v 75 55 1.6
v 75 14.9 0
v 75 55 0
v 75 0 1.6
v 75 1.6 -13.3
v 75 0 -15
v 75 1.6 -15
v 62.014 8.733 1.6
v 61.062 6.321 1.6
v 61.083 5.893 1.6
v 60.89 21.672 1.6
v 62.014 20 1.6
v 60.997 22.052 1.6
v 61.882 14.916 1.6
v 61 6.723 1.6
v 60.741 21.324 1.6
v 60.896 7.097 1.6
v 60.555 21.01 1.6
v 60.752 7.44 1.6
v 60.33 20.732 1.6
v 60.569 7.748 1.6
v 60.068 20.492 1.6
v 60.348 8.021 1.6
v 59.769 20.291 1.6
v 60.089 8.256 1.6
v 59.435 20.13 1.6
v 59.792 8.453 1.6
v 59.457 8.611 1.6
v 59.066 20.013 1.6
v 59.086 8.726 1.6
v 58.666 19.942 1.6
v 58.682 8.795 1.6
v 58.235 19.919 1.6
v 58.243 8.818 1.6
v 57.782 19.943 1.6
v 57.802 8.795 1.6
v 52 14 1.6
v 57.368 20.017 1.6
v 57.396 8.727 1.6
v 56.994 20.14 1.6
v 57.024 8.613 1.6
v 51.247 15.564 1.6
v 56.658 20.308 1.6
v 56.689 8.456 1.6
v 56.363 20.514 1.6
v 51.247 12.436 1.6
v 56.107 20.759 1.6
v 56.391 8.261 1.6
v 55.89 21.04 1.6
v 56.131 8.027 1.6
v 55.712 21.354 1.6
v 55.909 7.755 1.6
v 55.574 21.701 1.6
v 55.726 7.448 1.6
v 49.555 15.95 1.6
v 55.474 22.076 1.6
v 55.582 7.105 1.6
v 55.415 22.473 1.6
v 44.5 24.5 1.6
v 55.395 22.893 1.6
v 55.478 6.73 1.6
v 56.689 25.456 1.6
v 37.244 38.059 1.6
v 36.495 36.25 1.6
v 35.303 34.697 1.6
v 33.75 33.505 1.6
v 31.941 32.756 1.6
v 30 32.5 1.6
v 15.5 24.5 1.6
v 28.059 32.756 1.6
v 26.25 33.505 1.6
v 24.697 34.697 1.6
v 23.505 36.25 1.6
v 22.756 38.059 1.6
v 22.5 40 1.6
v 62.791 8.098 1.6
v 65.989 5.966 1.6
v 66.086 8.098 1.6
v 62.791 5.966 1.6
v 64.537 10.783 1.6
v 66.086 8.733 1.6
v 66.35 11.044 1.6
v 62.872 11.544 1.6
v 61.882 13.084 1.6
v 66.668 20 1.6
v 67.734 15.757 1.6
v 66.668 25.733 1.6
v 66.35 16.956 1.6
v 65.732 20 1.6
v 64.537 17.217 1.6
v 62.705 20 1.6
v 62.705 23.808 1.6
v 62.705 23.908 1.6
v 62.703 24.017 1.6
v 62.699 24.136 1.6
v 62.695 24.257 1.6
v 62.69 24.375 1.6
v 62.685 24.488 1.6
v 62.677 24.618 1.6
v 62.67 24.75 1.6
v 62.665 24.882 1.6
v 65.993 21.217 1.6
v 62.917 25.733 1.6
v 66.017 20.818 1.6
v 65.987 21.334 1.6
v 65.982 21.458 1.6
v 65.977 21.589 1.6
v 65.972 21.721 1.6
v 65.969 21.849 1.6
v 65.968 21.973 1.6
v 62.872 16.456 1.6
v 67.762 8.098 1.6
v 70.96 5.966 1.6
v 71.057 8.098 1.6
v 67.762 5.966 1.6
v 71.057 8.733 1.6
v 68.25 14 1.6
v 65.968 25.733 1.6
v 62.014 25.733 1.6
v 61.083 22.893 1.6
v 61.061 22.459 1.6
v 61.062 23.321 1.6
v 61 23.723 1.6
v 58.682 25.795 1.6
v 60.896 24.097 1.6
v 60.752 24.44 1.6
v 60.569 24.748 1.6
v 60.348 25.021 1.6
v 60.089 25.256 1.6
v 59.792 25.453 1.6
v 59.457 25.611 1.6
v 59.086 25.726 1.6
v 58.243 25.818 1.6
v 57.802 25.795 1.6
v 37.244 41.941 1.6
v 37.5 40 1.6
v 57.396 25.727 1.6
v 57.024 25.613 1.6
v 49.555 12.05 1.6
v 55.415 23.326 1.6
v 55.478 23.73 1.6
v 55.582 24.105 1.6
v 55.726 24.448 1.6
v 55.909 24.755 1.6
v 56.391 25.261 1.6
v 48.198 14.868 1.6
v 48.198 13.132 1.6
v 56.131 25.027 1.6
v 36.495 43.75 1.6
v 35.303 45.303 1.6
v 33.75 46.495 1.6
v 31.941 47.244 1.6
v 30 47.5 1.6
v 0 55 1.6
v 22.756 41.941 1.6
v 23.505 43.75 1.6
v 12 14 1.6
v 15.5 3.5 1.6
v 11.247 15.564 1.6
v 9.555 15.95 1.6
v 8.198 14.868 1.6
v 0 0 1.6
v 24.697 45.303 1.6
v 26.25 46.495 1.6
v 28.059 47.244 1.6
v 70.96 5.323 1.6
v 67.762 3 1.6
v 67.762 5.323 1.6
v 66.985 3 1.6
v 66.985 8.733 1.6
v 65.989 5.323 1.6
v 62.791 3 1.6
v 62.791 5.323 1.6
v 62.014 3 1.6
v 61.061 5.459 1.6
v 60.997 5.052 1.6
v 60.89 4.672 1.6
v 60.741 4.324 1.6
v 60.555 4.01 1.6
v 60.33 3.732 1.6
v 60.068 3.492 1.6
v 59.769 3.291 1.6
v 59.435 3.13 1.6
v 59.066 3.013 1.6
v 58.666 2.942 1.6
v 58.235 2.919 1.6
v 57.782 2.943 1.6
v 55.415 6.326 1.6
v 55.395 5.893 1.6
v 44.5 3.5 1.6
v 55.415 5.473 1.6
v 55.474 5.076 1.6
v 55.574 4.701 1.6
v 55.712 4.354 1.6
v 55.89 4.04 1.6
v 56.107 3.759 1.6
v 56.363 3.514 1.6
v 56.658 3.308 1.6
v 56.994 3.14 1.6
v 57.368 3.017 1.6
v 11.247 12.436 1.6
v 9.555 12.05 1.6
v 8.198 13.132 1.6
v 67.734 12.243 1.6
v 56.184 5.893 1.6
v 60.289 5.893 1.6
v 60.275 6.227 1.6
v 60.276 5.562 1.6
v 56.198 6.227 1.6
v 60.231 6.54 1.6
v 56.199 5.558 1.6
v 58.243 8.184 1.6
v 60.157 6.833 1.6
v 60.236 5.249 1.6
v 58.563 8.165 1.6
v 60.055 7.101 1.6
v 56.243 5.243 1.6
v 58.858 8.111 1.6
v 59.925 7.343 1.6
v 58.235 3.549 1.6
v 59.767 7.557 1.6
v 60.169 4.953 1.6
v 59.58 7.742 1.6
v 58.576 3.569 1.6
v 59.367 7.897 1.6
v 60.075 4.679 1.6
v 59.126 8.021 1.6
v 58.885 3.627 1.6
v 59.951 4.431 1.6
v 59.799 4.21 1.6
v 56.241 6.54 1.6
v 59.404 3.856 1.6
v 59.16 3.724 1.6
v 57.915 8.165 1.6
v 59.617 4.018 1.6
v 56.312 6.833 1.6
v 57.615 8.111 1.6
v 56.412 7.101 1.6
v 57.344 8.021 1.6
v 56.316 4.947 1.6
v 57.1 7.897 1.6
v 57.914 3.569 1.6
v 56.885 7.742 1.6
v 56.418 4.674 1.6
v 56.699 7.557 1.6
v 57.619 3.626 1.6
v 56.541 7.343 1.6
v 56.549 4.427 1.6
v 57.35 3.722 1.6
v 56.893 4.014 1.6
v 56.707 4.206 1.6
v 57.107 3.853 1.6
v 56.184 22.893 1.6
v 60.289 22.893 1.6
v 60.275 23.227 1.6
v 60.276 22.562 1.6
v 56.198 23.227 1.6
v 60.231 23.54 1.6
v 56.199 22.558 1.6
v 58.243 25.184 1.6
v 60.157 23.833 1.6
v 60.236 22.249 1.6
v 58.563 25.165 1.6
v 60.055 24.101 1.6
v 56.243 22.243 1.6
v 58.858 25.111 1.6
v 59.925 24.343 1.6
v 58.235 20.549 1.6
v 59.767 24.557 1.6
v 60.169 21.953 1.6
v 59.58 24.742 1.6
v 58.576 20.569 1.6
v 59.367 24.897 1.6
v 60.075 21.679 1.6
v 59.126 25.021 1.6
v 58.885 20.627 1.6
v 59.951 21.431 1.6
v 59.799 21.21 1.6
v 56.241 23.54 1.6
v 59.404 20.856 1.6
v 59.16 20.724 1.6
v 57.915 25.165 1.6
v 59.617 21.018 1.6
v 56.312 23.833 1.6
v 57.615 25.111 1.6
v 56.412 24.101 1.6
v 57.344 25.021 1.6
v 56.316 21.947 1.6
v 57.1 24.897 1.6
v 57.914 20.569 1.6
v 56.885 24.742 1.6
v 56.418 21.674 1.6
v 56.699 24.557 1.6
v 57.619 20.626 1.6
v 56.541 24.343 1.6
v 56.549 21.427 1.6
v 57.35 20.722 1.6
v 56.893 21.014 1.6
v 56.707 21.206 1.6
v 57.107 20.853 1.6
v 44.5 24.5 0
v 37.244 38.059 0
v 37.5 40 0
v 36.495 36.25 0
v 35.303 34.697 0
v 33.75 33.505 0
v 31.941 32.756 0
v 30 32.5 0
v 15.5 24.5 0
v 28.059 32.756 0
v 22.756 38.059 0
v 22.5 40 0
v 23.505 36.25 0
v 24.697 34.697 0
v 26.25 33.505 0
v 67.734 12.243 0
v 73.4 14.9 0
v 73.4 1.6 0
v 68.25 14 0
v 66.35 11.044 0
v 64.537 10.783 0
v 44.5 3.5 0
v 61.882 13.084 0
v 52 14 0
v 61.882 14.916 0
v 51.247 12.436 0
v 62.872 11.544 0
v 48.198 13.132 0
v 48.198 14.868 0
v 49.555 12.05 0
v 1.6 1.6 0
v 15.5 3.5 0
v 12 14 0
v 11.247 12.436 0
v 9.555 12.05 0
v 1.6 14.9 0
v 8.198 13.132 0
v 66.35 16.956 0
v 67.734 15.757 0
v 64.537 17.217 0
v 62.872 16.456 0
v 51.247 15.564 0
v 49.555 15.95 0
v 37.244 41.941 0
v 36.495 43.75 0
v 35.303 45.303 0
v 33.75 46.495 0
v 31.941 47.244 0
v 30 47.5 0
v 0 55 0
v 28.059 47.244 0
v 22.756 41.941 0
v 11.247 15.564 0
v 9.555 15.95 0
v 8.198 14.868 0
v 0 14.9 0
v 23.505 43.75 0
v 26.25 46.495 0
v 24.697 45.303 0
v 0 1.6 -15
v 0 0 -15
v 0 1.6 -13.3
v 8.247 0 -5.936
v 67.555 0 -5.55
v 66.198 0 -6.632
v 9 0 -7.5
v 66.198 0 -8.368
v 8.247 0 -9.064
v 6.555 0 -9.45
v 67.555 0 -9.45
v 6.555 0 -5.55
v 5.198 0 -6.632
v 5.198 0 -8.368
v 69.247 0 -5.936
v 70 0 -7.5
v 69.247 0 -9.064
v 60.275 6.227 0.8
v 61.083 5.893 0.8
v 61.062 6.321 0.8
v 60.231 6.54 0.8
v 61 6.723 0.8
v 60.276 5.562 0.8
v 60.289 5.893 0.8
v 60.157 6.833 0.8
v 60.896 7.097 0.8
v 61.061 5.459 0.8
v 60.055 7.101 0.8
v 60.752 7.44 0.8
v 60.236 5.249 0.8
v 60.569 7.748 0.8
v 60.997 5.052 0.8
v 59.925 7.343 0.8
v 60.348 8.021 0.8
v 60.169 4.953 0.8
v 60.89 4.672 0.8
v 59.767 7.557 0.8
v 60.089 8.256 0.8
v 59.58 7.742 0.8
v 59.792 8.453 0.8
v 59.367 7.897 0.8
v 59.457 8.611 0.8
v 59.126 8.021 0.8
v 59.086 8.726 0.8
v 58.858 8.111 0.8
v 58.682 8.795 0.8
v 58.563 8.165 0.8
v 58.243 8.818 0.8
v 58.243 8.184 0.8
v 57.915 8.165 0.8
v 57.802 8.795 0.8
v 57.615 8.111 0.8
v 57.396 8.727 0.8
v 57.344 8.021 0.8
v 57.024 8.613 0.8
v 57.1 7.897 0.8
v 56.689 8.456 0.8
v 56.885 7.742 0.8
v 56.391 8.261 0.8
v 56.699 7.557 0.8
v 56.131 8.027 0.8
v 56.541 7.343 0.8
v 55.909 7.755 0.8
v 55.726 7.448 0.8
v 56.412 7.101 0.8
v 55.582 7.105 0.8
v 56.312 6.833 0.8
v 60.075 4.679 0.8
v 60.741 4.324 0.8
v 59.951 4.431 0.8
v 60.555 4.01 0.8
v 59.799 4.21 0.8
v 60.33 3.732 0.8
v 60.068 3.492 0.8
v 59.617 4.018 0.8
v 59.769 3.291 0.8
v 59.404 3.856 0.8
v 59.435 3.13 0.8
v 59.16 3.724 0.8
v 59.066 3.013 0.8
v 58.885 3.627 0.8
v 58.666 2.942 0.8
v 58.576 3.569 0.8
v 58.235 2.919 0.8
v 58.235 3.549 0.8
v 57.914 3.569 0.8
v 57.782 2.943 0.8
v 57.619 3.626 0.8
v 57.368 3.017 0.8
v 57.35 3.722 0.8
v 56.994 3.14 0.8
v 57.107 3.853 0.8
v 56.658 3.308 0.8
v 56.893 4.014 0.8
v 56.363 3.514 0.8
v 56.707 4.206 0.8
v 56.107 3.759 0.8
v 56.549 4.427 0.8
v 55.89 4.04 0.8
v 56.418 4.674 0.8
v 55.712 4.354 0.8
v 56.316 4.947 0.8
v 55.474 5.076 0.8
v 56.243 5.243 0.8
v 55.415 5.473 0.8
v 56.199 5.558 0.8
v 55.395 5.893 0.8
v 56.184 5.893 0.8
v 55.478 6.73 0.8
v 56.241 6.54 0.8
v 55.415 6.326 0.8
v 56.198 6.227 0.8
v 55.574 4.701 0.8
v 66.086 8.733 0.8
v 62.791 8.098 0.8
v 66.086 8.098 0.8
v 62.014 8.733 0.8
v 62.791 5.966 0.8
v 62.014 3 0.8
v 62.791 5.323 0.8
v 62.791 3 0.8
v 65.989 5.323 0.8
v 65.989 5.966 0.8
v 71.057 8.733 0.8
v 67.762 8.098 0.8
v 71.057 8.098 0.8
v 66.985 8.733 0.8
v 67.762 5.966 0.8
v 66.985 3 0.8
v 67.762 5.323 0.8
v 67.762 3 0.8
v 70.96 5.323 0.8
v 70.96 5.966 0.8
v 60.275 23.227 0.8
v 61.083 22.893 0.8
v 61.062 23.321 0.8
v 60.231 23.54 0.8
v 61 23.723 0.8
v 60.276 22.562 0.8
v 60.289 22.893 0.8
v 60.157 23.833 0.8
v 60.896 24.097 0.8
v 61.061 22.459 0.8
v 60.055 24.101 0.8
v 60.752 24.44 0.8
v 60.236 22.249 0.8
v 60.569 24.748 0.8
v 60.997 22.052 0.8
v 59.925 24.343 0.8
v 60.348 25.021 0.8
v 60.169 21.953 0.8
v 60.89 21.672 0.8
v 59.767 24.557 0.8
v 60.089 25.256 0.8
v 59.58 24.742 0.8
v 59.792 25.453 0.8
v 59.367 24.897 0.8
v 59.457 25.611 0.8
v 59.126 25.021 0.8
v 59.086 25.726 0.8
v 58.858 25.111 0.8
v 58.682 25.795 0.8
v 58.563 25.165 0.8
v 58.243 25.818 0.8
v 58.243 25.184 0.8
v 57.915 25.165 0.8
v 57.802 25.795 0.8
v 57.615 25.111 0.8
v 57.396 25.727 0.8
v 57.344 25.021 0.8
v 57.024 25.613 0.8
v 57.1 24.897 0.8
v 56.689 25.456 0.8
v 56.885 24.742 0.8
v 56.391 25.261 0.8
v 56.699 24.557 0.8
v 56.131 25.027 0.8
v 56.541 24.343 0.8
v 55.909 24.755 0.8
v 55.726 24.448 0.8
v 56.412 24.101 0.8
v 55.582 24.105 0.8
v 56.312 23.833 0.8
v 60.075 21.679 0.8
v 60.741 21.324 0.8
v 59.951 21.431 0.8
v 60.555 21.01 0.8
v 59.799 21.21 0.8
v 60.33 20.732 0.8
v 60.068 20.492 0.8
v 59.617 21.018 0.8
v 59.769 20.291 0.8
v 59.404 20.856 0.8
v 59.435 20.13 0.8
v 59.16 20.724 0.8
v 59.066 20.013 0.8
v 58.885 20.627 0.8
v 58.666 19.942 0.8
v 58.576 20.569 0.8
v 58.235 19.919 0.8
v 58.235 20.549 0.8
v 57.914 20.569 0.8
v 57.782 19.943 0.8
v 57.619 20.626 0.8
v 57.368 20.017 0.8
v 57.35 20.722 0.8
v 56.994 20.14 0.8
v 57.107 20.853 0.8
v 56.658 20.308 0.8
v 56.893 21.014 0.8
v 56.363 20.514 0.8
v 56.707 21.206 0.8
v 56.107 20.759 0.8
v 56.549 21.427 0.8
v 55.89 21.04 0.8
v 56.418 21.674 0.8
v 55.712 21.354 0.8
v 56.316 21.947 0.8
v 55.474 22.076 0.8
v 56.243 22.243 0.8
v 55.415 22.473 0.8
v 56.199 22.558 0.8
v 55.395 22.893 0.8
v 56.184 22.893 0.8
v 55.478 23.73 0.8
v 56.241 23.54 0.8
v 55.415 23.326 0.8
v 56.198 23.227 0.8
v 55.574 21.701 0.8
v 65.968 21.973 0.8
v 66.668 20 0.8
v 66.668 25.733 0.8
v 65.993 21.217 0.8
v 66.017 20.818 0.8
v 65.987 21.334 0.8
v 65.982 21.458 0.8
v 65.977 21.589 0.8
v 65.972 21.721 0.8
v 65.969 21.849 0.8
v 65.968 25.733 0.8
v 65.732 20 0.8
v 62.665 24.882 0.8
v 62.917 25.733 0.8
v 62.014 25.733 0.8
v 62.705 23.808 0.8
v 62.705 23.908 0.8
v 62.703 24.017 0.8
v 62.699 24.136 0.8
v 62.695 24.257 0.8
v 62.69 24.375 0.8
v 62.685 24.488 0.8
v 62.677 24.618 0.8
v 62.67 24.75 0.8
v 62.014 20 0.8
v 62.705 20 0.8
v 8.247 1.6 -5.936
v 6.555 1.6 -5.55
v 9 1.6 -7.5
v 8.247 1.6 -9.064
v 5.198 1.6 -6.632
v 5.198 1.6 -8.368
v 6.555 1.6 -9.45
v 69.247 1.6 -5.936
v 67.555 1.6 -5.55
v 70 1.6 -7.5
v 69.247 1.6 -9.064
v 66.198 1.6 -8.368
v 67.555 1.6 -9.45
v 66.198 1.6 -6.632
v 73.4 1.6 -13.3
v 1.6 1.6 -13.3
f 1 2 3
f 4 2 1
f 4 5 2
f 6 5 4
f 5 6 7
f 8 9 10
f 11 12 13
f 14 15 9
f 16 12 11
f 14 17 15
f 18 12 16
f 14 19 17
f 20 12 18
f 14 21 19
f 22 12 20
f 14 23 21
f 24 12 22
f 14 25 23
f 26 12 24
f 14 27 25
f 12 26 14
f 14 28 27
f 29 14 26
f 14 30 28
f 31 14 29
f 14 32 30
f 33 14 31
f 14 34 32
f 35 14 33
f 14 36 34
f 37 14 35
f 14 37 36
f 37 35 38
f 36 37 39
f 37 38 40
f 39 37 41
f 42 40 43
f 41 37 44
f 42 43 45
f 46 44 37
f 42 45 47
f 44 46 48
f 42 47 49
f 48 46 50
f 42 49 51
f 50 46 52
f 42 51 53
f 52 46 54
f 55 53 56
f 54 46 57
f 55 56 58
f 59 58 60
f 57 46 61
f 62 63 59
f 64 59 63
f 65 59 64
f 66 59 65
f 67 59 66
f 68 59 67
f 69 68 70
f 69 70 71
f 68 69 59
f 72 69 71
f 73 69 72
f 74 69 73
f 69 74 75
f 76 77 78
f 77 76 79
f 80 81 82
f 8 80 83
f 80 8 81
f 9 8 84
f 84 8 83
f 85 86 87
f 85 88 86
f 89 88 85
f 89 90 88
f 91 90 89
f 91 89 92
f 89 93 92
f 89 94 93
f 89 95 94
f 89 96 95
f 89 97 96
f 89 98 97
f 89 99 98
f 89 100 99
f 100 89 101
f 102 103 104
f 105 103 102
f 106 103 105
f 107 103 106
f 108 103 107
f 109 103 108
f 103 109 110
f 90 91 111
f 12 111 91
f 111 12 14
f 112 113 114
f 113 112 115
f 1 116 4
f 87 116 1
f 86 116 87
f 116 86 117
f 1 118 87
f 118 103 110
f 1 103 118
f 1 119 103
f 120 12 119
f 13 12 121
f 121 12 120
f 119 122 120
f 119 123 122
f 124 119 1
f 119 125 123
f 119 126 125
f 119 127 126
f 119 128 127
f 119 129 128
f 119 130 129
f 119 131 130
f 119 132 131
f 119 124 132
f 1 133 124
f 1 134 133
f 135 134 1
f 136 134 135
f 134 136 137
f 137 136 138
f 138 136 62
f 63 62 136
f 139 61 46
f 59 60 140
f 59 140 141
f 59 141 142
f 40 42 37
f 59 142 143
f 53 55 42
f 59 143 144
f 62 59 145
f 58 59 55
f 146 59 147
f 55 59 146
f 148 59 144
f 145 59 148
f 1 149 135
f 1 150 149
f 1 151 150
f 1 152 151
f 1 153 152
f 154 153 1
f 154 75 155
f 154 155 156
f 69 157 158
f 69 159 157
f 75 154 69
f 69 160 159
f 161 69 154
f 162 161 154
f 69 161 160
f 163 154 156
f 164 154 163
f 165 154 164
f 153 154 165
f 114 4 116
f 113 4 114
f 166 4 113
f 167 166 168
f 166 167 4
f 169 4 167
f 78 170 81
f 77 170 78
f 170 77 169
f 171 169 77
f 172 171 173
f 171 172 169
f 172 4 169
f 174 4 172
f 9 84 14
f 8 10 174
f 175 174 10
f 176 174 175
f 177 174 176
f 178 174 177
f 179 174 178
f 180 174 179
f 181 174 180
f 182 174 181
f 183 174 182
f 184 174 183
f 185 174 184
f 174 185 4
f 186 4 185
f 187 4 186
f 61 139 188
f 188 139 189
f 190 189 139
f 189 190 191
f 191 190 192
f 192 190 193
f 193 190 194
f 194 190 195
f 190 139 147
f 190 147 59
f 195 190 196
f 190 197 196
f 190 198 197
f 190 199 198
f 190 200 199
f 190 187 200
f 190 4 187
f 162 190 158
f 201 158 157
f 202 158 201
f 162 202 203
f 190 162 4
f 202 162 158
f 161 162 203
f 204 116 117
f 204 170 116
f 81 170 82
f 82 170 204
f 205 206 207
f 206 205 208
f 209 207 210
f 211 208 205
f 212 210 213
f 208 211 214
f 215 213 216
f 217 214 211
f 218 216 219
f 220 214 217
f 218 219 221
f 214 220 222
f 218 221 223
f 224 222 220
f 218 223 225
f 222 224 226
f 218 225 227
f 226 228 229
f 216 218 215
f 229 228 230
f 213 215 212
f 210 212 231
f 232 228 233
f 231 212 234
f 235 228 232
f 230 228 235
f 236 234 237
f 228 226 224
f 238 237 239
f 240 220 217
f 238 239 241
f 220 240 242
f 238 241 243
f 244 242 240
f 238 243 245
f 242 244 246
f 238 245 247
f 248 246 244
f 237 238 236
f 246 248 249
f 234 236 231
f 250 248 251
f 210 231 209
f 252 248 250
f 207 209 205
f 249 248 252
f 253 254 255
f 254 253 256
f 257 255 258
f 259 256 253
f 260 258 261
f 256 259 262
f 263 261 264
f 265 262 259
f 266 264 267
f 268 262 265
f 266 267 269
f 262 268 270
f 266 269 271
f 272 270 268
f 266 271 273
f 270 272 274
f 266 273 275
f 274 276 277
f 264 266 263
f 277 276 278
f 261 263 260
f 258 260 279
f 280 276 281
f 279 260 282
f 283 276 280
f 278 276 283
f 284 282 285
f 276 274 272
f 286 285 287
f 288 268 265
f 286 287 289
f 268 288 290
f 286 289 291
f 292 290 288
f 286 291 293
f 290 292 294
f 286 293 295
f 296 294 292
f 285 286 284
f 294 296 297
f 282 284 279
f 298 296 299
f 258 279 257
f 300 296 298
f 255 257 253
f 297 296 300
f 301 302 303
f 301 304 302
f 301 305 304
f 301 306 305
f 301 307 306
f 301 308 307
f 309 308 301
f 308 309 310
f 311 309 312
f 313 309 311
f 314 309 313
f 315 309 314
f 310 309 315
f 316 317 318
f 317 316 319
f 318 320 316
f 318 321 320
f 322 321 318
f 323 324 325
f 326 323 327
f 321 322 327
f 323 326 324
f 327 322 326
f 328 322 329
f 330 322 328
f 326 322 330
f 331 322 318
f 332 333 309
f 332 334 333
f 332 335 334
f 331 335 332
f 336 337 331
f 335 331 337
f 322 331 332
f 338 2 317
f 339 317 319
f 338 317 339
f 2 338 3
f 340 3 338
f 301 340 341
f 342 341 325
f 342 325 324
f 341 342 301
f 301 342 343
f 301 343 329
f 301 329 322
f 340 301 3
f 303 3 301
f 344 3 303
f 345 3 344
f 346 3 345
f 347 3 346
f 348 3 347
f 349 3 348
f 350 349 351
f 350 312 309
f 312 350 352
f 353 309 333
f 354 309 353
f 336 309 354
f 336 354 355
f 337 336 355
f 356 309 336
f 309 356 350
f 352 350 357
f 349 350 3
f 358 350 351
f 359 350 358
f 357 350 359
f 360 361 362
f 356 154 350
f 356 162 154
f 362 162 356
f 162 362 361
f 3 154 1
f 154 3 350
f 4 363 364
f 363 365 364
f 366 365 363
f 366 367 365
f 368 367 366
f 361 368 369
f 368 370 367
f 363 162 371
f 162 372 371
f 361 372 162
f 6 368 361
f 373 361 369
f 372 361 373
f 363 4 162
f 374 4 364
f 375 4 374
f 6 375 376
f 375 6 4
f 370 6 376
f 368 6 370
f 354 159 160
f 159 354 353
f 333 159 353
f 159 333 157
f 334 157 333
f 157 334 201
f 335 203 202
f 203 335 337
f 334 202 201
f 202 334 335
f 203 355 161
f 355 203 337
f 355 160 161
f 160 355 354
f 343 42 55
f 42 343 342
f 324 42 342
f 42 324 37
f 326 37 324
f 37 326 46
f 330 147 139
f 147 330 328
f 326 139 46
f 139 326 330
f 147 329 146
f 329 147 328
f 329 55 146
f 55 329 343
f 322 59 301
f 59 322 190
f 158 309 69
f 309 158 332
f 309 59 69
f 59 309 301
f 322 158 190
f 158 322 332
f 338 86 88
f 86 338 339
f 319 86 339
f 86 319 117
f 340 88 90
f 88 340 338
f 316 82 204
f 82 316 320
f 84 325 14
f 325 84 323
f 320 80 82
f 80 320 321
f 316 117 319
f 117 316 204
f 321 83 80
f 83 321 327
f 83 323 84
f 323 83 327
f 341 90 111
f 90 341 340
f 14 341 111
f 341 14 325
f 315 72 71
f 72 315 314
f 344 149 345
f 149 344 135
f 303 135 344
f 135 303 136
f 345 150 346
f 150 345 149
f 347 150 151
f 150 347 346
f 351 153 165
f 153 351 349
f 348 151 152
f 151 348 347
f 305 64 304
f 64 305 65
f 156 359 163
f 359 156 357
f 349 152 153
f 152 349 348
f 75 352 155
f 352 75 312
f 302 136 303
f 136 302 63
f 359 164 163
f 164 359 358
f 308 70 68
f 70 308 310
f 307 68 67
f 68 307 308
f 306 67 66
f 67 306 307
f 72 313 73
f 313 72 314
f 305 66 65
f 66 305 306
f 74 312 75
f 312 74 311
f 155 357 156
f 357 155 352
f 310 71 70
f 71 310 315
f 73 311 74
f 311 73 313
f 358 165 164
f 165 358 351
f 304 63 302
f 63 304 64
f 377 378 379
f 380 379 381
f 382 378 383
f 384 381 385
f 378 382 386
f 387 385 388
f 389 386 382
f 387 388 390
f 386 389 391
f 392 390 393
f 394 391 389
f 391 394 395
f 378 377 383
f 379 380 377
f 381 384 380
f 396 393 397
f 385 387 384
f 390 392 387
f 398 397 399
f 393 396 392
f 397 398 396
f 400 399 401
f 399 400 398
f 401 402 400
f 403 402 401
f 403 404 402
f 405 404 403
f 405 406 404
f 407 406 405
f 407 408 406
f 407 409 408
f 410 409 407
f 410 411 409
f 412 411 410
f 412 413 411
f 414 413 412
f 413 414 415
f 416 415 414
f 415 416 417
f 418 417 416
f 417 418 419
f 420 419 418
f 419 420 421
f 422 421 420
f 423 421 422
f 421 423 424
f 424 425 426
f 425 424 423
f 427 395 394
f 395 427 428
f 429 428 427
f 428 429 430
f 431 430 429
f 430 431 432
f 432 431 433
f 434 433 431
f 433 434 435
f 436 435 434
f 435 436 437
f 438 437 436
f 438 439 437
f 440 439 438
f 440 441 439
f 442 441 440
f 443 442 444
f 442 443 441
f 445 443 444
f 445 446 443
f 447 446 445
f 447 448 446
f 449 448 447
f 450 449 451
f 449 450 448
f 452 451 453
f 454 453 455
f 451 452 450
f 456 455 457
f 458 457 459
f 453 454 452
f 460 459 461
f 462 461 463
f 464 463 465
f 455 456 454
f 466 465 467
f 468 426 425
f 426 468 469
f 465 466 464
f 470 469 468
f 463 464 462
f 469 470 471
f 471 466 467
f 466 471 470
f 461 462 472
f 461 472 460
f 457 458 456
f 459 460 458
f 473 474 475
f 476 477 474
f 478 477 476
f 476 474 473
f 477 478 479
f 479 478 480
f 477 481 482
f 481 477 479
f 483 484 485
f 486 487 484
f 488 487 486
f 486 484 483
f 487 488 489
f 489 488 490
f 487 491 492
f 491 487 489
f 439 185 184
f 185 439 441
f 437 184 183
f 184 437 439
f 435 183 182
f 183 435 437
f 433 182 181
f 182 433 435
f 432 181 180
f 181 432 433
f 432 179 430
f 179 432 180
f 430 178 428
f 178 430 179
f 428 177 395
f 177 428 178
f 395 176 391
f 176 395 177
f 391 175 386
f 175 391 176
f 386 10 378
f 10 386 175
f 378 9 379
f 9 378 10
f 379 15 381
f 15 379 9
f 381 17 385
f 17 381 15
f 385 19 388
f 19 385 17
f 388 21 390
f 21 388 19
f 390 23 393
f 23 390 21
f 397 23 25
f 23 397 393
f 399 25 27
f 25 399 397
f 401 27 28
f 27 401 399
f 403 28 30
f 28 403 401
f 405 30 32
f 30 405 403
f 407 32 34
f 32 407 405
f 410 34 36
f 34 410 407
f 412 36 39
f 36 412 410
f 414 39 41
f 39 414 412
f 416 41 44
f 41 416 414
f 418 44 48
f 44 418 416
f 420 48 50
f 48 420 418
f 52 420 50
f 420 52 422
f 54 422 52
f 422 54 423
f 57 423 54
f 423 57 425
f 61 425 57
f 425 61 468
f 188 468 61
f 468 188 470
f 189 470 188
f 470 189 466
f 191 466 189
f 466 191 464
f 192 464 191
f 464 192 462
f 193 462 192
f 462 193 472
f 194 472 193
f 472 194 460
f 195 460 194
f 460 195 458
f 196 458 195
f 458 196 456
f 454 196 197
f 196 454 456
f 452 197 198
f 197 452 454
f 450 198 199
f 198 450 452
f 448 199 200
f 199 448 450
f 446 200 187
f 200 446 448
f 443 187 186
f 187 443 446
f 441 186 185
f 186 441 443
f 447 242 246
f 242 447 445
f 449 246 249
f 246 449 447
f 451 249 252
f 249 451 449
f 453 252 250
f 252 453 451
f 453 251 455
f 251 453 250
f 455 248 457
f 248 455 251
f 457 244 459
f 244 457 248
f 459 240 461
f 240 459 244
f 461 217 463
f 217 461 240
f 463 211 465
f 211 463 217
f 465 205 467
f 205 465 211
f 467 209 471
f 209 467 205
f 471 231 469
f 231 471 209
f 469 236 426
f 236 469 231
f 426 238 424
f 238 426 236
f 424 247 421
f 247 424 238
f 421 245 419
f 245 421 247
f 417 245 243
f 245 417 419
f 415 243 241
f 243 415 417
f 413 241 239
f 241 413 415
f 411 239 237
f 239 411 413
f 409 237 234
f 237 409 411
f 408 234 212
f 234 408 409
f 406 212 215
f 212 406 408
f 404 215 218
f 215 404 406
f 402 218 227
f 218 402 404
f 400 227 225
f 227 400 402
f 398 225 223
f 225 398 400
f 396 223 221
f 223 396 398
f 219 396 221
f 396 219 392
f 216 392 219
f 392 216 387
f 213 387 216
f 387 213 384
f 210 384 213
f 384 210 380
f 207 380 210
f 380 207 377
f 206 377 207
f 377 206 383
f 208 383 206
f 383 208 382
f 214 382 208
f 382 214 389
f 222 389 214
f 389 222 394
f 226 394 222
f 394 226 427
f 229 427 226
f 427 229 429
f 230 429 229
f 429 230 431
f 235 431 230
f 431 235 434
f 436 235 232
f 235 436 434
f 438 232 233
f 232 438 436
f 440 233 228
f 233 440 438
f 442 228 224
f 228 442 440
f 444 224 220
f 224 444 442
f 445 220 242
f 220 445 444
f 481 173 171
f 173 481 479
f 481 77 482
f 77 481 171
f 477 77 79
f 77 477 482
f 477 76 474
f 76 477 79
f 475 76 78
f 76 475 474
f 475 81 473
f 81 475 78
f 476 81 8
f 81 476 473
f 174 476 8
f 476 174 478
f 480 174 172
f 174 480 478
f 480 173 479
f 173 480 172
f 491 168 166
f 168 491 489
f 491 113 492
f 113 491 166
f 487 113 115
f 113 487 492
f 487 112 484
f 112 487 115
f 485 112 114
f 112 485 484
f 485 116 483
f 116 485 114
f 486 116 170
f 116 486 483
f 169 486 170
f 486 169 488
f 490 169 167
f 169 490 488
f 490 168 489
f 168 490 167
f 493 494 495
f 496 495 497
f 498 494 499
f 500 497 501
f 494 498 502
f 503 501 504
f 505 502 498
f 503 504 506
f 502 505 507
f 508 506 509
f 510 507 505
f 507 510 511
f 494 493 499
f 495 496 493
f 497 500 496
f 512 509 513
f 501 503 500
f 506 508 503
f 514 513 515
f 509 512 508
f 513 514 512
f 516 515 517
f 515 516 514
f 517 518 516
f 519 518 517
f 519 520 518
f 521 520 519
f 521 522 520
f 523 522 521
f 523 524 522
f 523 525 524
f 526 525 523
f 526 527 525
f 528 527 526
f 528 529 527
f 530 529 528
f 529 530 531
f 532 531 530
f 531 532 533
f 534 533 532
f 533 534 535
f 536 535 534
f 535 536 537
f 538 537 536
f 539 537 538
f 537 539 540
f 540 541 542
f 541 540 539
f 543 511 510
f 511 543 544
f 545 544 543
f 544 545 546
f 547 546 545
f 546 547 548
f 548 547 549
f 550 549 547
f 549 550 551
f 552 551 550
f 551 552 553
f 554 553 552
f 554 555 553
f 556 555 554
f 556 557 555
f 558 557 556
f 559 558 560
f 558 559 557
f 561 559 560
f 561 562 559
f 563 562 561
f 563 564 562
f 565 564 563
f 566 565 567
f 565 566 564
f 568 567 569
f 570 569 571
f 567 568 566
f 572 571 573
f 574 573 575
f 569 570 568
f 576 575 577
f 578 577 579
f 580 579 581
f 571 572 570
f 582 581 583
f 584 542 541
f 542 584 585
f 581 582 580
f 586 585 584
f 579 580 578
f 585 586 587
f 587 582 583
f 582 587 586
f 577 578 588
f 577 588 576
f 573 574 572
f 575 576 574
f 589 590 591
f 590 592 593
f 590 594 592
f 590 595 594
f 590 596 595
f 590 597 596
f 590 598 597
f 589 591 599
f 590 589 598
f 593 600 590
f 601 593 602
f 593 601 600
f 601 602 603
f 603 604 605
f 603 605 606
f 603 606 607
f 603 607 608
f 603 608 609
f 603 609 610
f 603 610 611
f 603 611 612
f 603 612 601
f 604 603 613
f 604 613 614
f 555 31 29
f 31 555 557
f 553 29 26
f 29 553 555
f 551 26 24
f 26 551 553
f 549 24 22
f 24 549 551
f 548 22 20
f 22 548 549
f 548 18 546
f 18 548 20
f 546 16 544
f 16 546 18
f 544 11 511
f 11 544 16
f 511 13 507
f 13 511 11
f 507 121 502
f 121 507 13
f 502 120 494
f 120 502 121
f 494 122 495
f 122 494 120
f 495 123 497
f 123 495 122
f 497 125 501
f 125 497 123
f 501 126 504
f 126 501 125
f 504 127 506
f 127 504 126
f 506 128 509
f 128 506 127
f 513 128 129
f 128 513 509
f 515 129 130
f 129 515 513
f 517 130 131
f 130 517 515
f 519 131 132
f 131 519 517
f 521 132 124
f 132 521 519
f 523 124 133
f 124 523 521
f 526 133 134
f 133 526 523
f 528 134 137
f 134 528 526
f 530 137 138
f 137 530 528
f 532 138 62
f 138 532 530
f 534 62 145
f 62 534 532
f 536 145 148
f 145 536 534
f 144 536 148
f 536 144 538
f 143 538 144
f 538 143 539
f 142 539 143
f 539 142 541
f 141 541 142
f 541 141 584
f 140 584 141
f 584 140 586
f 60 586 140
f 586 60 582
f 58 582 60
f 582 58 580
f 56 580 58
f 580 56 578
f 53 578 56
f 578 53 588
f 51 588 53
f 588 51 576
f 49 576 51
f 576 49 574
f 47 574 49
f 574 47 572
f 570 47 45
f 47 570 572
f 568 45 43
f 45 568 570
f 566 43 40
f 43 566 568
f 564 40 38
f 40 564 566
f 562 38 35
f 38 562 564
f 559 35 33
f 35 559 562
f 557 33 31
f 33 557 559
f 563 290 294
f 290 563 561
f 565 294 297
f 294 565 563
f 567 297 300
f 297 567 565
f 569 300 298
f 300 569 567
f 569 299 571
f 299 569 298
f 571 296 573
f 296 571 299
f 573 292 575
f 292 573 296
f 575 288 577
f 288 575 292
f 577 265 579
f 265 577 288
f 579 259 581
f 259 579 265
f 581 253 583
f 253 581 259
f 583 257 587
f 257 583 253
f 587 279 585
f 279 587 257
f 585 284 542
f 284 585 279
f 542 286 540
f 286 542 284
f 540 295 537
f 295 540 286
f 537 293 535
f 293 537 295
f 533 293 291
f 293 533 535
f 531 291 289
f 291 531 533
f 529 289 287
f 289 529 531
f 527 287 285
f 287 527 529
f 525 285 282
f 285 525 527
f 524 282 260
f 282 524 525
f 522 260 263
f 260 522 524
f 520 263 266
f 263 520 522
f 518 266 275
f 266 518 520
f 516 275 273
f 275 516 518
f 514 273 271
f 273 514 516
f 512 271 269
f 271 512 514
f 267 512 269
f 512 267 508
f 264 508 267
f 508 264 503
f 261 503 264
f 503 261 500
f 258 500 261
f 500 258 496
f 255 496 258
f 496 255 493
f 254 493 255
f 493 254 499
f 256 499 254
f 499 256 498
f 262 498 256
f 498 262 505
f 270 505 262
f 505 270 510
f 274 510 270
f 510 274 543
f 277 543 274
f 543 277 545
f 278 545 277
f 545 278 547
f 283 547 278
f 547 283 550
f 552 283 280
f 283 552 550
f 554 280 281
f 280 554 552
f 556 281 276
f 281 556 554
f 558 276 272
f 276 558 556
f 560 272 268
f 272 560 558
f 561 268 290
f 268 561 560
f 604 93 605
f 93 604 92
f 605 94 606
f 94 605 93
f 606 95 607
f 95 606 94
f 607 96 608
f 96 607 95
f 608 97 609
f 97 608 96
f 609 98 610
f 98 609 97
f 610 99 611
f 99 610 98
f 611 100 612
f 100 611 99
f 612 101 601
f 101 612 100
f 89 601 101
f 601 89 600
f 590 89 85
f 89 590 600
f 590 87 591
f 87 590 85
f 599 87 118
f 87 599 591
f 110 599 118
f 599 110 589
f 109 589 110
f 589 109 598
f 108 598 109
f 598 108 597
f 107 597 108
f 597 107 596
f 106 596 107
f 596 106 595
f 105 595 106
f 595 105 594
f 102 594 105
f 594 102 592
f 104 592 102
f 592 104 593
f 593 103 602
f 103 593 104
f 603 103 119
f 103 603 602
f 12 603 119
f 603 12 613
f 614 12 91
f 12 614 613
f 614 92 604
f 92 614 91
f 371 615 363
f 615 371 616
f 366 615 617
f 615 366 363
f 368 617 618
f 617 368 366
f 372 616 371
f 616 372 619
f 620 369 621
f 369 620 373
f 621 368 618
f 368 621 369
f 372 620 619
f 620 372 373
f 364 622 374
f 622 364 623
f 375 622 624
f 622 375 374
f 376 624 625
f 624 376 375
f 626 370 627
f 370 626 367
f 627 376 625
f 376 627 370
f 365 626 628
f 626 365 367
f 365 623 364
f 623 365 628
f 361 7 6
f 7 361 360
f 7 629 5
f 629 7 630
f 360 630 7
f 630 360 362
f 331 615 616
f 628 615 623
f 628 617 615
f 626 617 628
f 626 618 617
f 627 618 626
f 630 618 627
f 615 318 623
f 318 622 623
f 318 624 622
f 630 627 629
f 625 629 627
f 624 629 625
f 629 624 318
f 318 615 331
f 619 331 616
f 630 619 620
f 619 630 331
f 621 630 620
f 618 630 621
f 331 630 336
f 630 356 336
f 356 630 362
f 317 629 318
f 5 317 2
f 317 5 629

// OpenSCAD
//
// fuse/switch bracket
//



wid = 75;
len = 55;
thk = 1.6;
wall = 15;

e = 0.1;

hole_dia = 4.0;

module hole( x, y, dia=4) {
  translate( [x, y, -e])
    cylinder( h=thk+2*e, d=dia);
}

module slot( x, y, wid, hgt) {
  translate( [x, y, -e])
     cube( [wid, hgt, thk+2*e]);
}

module righty( w, h, t) {
  linear_extrude( height=t, convexity=10) {
       polygon( [ [0,0], [w, 0], [0, h], [0, 0]]);
  }
}

module bracket() {
  difference() {
    cube( [wid, len, thk]);	/* plate */
    hole( 10, 14);
    hole( 10+40, 14);
    slot( (40-29)/2+10, 14-21/2, 29, 21);
    hole( 65, 14, 6.5);
    hole( 30, 40, 15);		/* fuse holder */
    translate( [55, 3, thk/2])
	 linear_extrude( height=thk) {
	     text( "OFF", size=6);
    }
    translate( [55, 20, thk/2])
	 linear_extrude( height=thk) {
	     text( "ON", size=6);
    }
    
		 
  }
  difference() {
    translate( [0, 0, -wall])
     cube( [wid, thk, wall+e]);
    rotate( [90, 0, 0])
      translate( [0, 0, -thk]) {
	 hole( 7, -wall/2);
	 hole( wid-7, -wall/2);
      }
  }
  translate( [0, 0, e])
  rotate( [0, 90, 0]) {
       righty( wall, wall, thk);
       translate( [0, 0, wid-thk])
	           righty( wall, wall, thk);
  }
}

bracket();
